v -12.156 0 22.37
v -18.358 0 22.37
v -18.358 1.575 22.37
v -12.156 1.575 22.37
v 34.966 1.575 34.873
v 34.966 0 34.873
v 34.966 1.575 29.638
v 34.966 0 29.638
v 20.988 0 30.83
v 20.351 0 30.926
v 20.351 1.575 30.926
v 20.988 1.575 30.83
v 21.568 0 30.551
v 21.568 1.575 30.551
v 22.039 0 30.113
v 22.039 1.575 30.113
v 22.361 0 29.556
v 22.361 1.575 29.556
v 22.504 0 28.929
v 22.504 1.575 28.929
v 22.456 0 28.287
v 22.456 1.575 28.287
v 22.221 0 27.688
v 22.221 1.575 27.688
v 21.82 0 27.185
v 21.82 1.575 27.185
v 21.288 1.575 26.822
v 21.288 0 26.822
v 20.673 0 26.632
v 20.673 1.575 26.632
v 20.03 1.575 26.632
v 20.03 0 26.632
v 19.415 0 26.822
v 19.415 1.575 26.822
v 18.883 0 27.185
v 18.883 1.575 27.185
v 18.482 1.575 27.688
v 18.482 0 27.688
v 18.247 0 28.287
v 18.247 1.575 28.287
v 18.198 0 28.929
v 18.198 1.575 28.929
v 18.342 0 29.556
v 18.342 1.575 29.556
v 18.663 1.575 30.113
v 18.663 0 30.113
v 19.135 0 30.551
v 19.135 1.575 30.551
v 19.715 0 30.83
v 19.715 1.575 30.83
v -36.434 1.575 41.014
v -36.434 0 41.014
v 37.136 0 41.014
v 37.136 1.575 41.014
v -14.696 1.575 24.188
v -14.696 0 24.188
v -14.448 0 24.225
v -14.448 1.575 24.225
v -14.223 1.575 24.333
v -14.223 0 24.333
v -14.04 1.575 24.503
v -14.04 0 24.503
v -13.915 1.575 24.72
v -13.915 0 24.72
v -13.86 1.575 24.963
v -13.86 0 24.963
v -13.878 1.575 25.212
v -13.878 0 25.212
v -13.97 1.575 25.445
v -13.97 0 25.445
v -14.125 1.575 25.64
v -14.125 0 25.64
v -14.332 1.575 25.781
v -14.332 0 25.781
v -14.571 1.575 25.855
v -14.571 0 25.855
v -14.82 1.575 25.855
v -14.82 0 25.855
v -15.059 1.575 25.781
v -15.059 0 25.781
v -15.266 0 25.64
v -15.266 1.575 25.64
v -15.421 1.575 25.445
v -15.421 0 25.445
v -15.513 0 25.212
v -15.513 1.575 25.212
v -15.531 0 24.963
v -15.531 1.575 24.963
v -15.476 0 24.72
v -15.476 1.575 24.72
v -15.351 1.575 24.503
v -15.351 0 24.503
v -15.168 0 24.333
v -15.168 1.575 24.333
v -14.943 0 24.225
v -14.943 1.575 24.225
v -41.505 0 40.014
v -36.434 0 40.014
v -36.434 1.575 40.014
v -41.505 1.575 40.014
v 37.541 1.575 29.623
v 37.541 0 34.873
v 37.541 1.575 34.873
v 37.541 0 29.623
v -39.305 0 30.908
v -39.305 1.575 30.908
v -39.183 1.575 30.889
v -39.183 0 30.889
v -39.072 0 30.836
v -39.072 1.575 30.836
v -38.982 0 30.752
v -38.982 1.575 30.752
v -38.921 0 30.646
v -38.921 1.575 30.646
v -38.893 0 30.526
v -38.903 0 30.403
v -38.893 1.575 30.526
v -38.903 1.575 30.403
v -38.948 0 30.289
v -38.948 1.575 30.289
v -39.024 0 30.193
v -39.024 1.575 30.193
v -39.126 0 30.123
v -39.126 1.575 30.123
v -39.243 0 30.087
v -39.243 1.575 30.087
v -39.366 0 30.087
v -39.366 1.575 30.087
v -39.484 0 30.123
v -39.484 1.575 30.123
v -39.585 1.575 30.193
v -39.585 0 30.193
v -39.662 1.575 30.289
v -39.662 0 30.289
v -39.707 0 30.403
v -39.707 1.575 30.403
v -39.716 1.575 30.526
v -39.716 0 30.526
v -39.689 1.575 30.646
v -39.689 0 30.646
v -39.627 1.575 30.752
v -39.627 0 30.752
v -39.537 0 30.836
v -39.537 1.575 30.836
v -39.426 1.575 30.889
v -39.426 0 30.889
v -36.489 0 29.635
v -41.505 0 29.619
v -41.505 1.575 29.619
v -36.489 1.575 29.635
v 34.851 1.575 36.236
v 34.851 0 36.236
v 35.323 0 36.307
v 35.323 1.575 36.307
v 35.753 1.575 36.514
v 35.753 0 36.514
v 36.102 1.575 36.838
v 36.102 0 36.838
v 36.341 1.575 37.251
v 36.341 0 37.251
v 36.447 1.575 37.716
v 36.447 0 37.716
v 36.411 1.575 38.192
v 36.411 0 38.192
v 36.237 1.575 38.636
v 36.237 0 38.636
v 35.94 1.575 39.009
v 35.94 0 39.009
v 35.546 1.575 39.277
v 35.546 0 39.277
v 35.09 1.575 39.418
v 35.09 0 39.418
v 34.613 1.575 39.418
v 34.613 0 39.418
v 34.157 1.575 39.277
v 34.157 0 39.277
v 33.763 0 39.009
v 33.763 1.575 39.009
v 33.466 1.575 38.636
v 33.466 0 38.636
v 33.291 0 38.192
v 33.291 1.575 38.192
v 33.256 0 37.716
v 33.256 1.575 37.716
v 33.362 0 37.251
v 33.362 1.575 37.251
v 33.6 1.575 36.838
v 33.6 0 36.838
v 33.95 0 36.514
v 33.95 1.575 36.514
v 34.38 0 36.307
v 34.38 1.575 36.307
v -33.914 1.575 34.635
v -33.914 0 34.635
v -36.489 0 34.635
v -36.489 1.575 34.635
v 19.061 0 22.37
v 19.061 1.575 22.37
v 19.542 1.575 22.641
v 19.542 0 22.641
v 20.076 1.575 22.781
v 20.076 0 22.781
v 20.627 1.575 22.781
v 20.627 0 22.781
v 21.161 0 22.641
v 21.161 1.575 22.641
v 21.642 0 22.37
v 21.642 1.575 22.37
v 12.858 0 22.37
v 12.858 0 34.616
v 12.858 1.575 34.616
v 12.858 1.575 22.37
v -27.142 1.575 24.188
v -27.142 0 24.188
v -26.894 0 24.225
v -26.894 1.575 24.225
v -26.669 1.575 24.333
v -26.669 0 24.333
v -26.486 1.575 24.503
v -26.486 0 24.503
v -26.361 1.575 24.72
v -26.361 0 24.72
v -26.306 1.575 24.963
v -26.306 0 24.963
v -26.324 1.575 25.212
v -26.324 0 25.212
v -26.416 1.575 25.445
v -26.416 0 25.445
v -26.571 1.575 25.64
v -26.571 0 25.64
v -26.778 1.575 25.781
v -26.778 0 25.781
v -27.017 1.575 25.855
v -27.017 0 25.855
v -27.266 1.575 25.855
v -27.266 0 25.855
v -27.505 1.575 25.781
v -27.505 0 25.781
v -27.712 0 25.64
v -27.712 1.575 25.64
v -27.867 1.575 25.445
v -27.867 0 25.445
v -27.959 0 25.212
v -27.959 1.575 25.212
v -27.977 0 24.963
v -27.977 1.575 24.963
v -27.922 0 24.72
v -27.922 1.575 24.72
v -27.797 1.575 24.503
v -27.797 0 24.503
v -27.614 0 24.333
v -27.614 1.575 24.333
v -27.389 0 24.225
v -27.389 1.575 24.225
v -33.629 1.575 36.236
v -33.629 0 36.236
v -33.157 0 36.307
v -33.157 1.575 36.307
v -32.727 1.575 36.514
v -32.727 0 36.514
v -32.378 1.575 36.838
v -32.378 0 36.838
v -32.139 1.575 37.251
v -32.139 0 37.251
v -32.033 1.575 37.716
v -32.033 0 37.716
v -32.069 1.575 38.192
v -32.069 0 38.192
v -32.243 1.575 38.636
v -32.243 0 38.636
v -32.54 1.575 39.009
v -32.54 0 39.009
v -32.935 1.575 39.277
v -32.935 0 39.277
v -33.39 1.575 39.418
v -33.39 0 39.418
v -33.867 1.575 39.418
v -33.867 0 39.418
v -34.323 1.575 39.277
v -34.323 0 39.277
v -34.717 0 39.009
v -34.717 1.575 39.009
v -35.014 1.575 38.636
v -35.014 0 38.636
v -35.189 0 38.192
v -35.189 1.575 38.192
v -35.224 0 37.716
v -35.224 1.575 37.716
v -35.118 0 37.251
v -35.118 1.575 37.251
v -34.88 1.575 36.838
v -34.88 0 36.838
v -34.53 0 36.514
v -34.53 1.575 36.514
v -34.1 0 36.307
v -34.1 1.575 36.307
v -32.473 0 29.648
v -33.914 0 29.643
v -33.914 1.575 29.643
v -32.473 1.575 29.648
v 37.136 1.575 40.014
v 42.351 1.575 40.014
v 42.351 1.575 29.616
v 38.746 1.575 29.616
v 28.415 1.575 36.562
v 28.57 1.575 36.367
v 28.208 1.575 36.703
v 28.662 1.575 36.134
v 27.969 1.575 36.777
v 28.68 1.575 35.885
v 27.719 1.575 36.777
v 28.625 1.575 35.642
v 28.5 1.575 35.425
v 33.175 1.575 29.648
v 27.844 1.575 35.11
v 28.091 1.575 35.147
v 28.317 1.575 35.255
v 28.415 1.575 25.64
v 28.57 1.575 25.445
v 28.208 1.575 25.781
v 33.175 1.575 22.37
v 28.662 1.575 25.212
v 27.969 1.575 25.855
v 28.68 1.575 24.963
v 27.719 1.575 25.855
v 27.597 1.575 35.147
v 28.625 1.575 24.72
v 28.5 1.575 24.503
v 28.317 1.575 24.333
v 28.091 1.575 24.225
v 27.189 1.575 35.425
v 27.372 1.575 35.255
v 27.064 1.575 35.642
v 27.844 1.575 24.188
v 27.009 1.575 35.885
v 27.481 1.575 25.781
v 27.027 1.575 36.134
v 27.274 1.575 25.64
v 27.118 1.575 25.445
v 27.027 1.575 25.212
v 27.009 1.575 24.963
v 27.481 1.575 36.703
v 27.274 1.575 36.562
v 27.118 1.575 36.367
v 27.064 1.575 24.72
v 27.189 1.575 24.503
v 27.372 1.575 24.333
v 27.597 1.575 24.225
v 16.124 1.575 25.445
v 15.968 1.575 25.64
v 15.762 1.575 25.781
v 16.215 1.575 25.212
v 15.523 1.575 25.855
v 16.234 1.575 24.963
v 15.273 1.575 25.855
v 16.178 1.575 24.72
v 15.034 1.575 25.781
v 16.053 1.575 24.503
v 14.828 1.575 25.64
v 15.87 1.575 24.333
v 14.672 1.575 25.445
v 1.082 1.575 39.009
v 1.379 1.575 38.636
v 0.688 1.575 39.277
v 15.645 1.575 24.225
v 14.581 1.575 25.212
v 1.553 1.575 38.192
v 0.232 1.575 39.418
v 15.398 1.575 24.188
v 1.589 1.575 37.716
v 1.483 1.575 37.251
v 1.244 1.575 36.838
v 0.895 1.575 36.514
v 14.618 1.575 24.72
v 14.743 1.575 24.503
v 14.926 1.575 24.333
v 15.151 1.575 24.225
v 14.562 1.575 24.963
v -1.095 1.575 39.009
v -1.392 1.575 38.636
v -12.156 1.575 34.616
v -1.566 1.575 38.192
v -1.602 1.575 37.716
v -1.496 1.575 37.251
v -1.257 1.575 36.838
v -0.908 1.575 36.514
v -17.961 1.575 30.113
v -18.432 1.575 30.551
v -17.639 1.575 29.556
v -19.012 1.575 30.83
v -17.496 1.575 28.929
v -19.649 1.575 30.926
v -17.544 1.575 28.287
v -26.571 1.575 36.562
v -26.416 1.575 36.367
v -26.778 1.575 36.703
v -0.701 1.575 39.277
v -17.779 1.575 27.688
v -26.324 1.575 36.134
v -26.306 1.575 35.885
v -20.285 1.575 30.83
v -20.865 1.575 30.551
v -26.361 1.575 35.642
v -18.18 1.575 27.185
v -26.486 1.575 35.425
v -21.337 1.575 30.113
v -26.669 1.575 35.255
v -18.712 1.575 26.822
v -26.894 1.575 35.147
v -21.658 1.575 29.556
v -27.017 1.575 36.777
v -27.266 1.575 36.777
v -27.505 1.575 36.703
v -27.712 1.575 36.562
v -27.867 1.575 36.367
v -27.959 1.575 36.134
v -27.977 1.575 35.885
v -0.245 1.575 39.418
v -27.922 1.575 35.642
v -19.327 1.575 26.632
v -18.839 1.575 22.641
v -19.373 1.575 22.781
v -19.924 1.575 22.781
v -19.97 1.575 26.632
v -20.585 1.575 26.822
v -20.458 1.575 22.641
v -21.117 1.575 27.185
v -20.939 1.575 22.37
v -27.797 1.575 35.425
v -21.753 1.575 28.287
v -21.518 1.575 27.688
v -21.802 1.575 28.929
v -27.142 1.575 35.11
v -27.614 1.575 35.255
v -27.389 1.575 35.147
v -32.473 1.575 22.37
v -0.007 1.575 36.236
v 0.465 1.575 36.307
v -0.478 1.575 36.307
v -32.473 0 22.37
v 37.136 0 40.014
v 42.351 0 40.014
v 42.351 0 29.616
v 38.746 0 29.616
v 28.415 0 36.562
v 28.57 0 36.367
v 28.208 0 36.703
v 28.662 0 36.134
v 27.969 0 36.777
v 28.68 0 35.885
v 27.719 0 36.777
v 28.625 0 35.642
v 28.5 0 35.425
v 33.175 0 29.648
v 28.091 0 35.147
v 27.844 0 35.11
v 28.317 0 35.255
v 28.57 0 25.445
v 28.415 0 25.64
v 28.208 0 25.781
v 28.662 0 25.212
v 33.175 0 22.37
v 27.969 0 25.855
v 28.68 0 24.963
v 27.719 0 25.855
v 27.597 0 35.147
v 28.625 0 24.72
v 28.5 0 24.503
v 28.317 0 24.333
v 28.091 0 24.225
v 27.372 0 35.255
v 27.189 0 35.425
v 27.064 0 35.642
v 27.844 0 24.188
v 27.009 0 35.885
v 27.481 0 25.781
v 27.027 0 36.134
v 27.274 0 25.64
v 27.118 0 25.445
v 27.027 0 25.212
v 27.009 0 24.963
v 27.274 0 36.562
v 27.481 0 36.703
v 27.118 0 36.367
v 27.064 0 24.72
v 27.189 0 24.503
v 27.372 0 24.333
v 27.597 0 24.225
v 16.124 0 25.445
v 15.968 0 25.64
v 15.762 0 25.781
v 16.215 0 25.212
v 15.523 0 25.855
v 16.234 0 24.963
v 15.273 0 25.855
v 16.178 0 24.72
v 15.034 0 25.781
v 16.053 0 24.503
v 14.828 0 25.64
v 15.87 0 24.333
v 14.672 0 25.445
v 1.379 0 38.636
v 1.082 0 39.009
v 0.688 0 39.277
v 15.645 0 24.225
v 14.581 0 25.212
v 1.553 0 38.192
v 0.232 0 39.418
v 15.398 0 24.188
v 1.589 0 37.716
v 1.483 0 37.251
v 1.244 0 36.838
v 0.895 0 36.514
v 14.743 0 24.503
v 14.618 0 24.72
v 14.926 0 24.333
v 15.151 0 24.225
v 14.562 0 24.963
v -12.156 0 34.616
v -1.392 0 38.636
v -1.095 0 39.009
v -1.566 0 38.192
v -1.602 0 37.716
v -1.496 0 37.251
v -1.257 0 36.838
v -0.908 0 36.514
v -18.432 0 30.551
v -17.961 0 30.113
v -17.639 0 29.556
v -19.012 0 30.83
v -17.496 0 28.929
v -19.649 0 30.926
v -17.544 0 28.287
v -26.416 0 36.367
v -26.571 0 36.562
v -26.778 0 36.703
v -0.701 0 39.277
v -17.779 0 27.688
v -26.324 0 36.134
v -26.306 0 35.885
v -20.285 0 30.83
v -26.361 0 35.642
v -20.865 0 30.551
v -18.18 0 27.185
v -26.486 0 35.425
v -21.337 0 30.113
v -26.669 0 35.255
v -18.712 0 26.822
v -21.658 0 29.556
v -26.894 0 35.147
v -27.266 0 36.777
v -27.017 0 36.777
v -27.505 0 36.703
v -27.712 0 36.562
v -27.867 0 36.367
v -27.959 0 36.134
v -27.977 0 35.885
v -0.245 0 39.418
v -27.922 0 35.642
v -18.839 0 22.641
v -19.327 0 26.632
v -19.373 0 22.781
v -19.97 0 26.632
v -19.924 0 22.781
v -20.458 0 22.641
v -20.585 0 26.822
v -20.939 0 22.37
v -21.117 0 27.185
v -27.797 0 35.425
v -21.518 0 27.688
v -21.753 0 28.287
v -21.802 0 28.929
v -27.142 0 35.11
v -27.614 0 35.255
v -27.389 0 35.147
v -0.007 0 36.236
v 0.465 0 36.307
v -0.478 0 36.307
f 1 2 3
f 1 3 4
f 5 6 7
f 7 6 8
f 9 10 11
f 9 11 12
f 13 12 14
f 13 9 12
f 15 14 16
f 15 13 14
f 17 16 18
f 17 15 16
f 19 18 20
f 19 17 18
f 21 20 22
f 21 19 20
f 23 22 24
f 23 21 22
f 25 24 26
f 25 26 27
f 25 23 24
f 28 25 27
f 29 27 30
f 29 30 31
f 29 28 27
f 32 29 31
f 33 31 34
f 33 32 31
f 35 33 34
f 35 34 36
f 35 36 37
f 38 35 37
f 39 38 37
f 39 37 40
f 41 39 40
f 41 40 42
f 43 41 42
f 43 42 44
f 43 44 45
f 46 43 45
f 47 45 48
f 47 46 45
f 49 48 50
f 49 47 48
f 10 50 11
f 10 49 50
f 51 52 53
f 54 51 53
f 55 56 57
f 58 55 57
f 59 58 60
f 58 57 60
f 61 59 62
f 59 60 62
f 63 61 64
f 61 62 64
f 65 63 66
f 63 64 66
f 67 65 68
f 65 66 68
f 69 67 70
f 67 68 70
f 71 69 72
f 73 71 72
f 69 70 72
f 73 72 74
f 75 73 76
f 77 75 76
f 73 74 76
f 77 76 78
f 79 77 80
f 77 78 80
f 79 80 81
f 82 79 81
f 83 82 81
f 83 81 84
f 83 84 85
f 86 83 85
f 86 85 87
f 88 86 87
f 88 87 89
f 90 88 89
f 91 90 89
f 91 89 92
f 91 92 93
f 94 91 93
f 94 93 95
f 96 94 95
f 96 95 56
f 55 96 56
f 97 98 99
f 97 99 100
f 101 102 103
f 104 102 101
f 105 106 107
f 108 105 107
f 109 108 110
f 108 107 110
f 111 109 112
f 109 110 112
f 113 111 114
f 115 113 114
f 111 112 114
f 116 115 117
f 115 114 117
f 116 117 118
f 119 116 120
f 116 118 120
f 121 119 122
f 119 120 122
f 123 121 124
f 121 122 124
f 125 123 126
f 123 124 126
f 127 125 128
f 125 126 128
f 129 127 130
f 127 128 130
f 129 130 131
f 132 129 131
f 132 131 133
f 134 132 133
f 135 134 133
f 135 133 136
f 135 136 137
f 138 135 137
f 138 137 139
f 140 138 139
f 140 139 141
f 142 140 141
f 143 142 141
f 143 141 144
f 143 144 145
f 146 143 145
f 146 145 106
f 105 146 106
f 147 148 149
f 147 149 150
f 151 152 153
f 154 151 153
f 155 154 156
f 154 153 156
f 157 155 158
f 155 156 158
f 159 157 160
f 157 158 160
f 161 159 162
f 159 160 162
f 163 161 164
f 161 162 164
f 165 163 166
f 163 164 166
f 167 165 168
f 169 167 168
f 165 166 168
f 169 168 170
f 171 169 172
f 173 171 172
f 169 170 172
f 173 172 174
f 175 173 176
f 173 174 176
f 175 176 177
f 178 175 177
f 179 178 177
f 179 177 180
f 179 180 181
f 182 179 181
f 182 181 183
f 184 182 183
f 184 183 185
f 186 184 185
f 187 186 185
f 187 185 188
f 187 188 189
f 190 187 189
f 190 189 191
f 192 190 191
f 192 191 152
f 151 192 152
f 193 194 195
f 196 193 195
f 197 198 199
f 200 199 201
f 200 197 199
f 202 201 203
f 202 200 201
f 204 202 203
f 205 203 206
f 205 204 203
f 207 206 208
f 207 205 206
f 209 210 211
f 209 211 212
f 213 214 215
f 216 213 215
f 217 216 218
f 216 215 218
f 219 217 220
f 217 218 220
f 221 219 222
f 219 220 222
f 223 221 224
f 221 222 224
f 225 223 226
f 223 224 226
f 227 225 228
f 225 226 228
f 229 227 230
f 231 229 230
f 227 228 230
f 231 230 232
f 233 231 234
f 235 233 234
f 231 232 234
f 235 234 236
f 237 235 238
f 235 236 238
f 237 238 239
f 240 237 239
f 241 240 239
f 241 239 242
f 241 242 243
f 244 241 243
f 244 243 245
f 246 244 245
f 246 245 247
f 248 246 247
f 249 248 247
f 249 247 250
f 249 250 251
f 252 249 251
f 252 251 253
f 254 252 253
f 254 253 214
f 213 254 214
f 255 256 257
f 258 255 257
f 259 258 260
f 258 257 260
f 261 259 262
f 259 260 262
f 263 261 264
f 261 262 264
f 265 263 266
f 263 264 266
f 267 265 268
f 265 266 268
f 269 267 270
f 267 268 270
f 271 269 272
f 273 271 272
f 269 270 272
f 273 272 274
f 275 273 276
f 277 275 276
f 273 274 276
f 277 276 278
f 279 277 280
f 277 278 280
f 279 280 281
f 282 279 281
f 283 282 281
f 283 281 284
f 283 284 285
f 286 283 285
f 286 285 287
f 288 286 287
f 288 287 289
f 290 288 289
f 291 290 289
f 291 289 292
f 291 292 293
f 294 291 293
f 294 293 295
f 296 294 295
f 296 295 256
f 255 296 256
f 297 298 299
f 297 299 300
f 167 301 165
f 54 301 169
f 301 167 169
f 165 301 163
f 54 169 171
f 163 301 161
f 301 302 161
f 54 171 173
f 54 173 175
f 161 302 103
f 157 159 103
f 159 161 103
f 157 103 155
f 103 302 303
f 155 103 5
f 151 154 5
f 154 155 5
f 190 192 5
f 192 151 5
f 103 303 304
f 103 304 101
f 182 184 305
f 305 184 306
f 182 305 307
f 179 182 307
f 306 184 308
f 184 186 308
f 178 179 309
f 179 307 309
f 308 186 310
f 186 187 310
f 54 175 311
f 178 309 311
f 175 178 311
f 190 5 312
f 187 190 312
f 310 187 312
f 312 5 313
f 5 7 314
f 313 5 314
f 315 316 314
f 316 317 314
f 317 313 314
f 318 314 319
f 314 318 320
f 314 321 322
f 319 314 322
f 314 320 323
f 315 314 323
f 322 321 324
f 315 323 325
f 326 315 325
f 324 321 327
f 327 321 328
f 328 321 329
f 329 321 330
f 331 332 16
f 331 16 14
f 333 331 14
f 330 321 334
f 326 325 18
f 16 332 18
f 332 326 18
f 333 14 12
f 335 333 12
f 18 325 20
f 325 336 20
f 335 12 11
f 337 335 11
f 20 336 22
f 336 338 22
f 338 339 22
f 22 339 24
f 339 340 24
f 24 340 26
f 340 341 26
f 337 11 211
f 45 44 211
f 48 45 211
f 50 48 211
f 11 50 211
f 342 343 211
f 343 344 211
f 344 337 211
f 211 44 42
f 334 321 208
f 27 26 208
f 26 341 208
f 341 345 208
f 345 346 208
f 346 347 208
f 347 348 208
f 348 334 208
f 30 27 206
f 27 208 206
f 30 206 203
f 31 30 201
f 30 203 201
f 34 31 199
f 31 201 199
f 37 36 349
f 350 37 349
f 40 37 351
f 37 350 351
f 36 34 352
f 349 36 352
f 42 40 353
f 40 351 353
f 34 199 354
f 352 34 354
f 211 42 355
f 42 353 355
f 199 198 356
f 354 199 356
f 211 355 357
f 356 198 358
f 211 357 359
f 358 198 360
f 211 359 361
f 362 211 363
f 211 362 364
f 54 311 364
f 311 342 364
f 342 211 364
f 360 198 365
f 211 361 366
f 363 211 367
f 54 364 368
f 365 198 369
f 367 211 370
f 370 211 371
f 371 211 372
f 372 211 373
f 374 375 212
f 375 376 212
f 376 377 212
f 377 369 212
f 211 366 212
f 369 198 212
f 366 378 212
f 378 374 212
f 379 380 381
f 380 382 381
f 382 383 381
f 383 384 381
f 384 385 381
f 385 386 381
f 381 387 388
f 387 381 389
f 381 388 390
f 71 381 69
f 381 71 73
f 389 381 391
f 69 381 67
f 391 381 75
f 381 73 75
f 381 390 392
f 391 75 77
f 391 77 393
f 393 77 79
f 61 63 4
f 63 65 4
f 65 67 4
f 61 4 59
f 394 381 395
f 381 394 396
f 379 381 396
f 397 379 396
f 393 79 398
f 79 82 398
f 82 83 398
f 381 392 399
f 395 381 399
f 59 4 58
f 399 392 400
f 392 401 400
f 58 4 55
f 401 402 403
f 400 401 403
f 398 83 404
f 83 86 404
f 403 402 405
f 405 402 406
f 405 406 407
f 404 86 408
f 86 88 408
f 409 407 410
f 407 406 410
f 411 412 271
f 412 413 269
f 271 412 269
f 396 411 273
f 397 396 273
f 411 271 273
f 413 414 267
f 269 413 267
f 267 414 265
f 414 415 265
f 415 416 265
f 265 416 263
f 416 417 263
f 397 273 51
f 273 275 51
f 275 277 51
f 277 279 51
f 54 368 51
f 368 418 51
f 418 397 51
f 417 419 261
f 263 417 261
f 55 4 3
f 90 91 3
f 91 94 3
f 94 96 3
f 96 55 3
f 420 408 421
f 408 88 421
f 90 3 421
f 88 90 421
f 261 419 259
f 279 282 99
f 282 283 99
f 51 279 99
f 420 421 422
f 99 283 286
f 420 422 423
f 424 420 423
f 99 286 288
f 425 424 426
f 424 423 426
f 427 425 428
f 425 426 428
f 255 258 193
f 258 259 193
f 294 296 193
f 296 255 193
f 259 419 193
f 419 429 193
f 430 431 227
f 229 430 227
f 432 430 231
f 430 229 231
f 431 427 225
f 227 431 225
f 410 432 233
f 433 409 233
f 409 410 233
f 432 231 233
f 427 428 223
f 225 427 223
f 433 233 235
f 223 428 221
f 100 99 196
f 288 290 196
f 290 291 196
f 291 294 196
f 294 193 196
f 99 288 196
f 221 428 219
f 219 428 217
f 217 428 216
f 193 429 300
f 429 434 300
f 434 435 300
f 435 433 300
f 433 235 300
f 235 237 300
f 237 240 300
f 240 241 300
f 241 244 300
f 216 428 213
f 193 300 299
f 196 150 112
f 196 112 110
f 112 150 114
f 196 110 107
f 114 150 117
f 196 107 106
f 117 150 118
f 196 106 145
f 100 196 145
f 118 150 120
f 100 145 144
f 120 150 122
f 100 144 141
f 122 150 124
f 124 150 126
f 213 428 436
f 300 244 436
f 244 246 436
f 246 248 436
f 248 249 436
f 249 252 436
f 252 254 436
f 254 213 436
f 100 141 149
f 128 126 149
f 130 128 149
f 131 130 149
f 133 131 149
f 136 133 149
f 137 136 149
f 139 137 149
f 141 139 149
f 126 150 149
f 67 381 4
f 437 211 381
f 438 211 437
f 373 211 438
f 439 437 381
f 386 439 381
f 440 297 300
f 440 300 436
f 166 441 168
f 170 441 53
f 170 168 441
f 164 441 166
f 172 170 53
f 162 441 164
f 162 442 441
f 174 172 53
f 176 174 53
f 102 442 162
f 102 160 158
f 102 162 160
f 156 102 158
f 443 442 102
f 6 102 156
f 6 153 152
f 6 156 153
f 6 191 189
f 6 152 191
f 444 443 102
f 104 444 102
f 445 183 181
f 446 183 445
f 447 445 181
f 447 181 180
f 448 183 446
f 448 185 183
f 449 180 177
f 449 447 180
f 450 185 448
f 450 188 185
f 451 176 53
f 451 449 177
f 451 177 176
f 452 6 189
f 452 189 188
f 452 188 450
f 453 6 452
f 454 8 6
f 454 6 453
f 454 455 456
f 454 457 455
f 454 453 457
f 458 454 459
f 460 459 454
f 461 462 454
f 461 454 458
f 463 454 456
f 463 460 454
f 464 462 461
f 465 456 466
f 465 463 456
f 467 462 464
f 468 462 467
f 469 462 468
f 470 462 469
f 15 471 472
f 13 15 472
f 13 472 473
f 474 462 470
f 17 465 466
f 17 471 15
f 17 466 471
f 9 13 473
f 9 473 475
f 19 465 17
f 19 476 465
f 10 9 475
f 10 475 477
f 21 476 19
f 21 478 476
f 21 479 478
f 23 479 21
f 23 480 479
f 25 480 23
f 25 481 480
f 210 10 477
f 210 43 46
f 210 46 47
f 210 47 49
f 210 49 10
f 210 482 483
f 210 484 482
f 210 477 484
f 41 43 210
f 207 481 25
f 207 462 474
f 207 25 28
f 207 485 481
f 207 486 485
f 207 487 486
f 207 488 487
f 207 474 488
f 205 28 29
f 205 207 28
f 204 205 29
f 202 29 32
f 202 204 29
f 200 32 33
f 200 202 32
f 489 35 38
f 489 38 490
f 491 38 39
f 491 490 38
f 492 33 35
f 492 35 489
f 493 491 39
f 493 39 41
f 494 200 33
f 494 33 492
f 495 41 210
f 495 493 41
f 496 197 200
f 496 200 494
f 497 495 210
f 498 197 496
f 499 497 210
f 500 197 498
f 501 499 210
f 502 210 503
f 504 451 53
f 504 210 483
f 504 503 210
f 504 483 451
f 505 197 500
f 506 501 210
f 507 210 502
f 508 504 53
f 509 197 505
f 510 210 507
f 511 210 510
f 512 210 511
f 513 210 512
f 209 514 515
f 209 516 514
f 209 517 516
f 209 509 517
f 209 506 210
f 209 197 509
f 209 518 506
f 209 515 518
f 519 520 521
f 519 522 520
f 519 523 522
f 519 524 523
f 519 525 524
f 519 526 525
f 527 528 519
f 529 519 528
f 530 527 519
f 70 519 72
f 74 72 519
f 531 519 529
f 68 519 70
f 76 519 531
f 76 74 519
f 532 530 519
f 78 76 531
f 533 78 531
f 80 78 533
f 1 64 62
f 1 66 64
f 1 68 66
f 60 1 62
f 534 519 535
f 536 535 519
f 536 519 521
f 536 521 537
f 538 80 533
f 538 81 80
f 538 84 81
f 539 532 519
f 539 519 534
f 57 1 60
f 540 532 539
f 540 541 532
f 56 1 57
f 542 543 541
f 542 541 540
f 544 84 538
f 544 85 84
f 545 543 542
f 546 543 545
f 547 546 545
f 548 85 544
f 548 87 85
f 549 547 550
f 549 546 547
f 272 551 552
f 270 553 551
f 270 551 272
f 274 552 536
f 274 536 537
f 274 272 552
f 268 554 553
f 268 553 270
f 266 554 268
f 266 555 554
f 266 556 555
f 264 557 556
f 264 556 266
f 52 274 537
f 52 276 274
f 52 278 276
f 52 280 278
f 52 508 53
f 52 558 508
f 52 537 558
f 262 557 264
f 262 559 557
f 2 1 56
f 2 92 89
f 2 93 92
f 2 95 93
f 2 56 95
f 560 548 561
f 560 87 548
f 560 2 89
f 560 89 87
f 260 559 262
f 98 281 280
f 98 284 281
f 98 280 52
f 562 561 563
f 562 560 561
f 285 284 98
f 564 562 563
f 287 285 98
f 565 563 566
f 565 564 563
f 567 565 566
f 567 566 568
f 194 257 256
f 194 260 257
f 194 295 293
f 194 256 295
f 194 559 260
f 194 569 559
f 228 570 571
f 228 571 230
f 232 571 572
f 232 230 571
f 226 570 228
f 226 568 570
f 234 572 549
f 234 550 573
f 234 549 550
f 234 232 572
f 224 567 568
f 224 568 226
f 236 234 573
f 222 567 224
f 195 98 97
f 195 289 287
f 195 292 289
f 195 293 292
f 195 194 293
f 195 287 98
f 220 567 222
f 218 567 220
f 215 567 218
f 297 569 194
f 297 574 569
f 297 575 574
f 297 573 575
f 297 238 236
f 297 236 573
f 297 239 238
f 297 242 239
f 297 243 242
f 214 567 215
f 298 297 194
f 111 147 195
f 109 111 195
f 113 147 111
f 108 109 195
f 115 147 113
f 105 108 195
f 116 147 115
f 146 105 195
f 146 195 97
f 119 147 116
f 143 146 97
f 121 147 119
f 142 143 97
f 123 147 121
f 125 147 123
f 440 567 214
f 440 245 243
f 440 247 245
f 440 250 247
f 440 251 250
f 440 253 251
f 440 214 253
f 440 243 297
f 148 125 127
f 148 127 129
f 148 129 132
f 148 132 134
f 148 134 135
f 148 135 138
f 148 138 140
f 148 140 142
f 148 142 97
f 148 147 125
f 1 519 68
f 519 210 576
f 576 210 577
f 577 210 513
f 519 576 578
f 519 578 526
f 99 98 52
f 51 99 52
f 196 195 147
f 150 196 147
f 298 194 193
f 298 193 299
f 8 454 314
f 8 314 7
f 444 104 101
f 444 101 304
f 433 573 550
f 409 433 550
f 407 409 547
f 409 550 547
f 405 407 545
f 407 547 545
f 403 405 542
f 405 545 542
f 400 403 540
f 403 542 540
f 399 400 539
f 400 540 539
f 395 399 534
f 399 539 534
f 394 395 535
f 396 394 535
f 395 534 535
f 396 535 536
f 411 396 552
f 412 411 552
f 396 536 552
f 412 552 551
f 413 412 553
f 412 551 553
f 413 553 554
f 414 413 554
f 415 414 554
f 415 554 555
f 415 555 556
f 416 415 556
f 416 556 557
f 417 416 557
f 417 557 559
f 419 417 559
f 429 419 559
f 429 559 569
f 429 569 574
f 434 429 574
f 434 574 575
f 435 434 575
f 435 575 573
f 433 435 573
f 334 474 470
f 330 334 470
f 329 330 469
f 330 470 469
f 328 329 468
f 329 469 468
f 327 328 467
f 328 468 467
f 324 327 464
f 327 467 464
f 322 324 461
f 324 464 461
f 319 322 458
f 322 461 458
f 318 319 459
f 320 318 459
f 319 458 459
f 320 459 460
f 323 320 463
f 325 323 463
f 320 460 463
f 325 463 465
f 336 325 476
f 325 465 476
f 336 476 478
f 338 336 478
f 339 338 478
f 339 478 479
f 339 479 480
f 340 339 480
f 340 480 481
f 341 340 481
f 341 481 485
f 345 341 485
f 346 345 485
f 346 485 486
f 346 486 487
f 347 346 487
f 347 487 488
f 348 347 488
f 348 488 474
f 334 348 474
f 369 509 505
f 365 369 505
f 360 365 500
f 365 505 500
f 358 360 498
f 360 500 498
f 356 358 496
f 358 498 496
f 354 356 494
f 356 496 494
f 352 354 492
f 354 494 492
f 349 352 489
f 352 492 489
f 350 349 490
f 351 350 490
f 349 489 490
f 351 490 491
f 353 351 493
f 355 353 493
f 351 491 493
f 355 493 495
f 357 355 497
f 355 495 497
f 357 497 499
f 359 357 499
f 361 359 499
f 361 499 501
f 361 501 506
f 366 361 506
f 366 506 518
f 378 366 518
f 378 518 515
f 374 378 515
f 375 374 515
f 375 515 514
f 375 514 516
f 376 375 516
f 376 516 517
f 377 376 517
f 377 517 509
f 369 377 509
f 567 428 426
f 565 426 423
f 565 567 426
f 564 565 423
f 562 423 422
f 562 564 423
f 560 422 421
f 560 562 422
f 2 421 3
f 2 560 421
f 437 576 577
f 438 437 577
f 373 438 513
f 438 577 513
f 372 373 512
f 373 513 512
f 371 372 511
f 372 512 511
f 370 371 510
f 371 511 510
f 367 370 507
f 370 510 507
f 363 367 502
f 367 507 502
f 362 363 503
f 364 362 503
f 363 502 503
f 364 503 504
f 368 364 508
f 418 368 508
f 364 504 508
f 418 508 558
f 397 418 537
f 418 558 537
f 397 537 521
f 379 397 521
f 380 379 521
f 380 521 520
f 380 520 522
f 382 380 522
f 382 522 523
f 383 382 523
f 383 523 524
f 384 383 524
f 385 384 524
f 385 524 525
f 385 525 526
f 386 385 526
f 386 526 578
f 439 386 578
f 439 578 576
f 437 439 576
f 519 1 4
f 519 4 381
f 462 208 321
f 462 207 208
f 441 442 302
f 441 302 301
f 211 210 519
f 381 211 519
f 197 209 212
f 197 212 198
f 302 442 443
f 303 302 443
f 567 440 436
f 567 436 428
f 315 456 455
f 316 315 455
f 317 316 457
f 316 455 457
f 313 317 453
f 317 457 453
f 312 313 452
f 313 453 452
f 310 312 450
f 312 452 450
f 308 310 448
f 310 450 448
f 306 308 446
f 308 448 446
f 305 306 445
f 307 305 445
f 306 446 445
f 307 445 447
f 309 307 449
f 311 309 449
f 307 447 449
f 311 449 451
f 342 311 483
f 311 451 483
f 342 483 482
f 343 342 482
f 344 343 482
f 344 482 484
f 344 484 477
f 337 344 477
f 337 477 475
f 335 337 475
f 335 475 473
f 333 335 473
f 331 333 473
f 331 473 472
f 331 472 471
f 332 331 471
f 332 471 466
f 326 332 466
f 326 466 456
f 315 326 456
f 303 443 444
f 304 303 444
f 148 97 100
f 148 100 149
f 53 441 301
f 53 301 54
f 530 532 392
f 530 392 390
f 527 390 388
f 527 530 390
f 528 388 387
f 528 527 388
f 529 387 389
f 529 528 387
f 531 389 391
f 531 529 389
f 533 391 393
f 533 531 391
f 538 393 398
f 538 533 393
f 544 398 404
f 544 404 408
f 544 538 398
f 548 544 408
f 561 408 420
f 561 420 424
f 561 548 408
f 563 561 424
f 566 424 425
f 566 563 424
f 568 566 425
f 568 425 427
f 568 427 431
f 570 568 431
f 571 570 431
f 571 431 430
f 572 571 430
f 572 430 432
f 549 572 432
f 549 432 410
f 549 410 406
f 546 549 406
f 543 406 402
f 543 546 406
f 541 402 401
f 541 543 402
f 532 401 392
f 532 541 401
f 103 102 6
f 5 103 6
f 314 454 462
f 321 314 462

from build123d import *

# Parameters (mm, degrees)
SKETCH1_R                           = 2.159
BOSS_EXTRUDE1_DEPTH                 = 1.575
SKETCH2_W                           = 93.457658642
SKETCH2_H                           = 6.602
CUT_EXTRUDE1_DEPTH                  = 65.362755899
CUT_EXTRUDE2_DEPTH                  = 60.755092082
CUT_EXTRUDE3_DEPTH                  = 60.755092082
SKETCH6_R                           = 0.8382
CUT_EXTRUDE4_DEPTH                  = 2.54
SKETCH7_W                           = 65.648
SKETCH7_H                           = 12
CUT_EXTRUDE5_DEPTH                  = 59.286069146
SKETCH11_R                          = 0.412551942
ID_HOLE_DEPTH                       = 59.286069146
SKETCH12_W                          = 2.575
SKETCH12_H                          = 5
NOTCH_FOR_BPR_TOP_VIEW_DEPTH        = 59.286069146
SKETCH14_W                          = 2.575
SKETCH14_H                          = 12.502619879
NOTCH_FOR_BPL_TOP_VIEW_DEPTH        = 59.286069146
SKETCH17_W                          = 73.57
SKETCH17_H                          = 1
CREATE_LIP_FOR_M3_SPACER_HOLE_DEPTH = 1.575
SKETCH15_R                          = 1.6
HOLE_FOR_M3_SPACER_DEPTH            = 59.977069112


with BuildPart() as part:
    # Sketch1 → Boss-Extrude1 (new body)
    with BuildSketch(Plane(origin=(0, 0, 0), x_dir=(1, 0, 0), z_dir=(0, 1, 0))):
        Polygon((44.351293299, -40.014412246), (37.136293299, -40.014412246), (37.136293299, -46.615946892), (29.968293307, -46.615946892), (-30.083706693, -46.615946892), (-36.433706701, -46.615946892), (-36.433706701, -40.014412246), (-43.648706701, -40.014412246), (-43.648706701, -30.885946892), (-43.648706701, -29.647946892), (-42.378706693, -29.615946892), (-32.472706701, -29.647946892), (-32.472706701, -10.370428445), (-12.155556701, -10.370428445), (-12.155556701, -34.615947016), (-11.557706701, -34.615947016), (12.260293299, -34.615947016), (12.858143299, -34.615947016), (12.858143299, -10.370428445), (33.175293299, -10.370428445), (33.175293299, -12.929386892), (33.175293299, -29.647946892), (38.746293307, -29.615946892), (42.351293307, -29.615946892), (44.351293299, -29.615946892), (44.351293299, -31.651946892), align=None)
        with Locations(Location((-19.648556701, -28.76738335, 0), (0, 0, 270))):
            Circle(SKETCH1_R, mode=Mode.SUBTRACT)
        with Locations(Location((-19.648556701, -20.63938335, 0), (0, 0, 270))):
            Circle(SKETCH1_R, mode=Mode.SUBTRACT)
        with Locations(Location((20.351397299, -20.63938335, 0), (0, 0, 270))):
            Circle(SKETCH1_R, mode=Mode.SUBTRACT)
        with Locations(Location((20.351397299, -28.76738335, 0), (0, 0, 270))):
            Circle(SKETCH1_R, mode=Mode.SUBTRACT)
    extrude(amount=BOSS_EXTRUDE1_DEPTH)

    # Sketch2 → Cut-Extrude1 (cut, through all)
    with BuildSketch(Plane.XZ):
        with Locations((-2.377536022, 43.315412246)):
            Rectangle(SKETCH2_W, SKETCH2_H)
    extrude(amount=-CUT_EXTRUDE1_DEPTH, mode=Mode.SUBTRACT)

    # Sketch3 → Cut-Extrude2 (cut, through all)
    with BuildSketch(Plane.XZ):
        Polygon((-41.504650493, 40.014412246), (-41.504650493, 29.618770413), (-34.629650483, 29.640979175), (-34.629650483, 8.976090323), (-48.128778183, 8.976090323), (-48.128778183, 40.014412246), align=None)
    extrude(amount=-CUT_EXTRUDE2_DEPTH, mode=Mode.SUBTRACT)

    # Sketch4 → Cut-Extrude3 (cut, through all)
    with BuildSketch(Plane.XZ):
        Polygon((42.351293299, 40.014412246), (42.351293299, 32.420104455), (42.351293299, 29.615946892), (35.476293307, 29.615946892), (35.476293307, 10.370428445), (54.710892309, 10.370428445), (54.710892309, 40.014412246), align=None)
    extrude(amount=-CUT_EXTRUDE3_DEPTH, mode=Mode.SUBTRACT)

    # Sketch6 → Cut-Extrude4 (cut)
    with BuildSketch(Plane(origin=(0, 0, 0), x_dir=(-1, 0, 0), z_dir=(0, -1, 0))):
        with Locations(Location((27.141556701, -35.947946892, 0), (0, 0, 90))):
            Circle(SKETCH6_R)
        with Locations(Location((27.141556701, -25.025946892, 0), (0, 0, 90))):
            Circle(SKETCH6_R)
        with Locations(Location((14.695556701, -25.025946892, 0), (0, 0, 90))):
            Circle(SKETCH6_R)
        with Locations(Location((-15.398143299, -25.025946892, 0), (0, 0, 90))):
            Circle(SKETCH6_R)
        with Locations(Location((-27.844397299, -25.025946892, 0), (0, 0, 90))):
            Circle(SKETCH6_R)
        with Locations(Location((-27.844397299, -35.947946892, 0), (0, 0, 90))):
            Circle(SKETCH6_R)
    extrude(amount=-CUT_EXTRUDE4_DEPTH, mode=Mode.SUBTRACT)

    # Sketch7 → Cut-Extrude5 (cut, through all)
    with BuildSketch(Plane.XZ):
        with Locations((0.351293299, 16.370428445)):
            Rectangle(SKETCH7_W, SKETCH7_H)
    extrude(amount=-CUT_EXTRUDE5_DEPTH, mode=Mode.SUBTRACT)

    # Sketch11 → ID HOLE (cut, through all)
    with BuildSketch(Plane(origin=(0, 1.575, 0), x_dir=(1, 0, 0), z_dir=(0, 1, 0))):
        with Locations(Location((-39.304798754, -30.495020326, 0), (0, 0, 270))):
            Circle(SKETCH11_R)
    extrude(amount=-ID_HOLE_DEPTH, mode=Mode.SUBTRACT)

    # Sketch12 → Notch for BPR (TOP VIEW) (cut, through all)
    with BuildSketch(Plane(origin=(0, 0, 0), x_dir=(-1, 0, 0), z_dir=(0, -1, 0))):
        with Locations((35.201150493, -32.134973926)):
            Rectangle(SKETCH12_W, SKETCH12_H)
    extrude(amount=-NOTCH_FOR_BPR_TOP_VIEW_DEPTH, mode=Mode.SUBTRACT)

    # Sketch14 → Notch for BPL (TOP VIEW) (cut, through all)
    with BuildSketch(Plane(origin=(0, 0, 0), x_dir=(-1, 0, 0), z_dir=(0, -1, 0))):
        with Locations((-36.253849507, -28.621738385)):
            Rectangle(SKETCH14_W, SKETCH14_H)
    extrude(amount=-NOTCH_FOR_BPL_TOP_VIEW_DEPTH, mode=Mode.SUBTRACT)

    # Sketch17 → Create Lip for M3 Spacer Hole (add)
    with BuildSketch(Plane.XZ):
        with Locations((0.351293299, 40.514412246)):
            Rectangle(SKETCH17_W, SKETCH17_H)
    extrude(amount=-CREATE_LIP_FOR_M3_SPACER_HOLE_DEPTH)

    # Sketch15 → HOLE for M3 Spacer (cut, through all)
    with BuildSketch(Plane.XZ):
        with Locations(Location((-0.006565304, 37.835831124, 0), (0, 0, 270))):
            Circle(SKETCH15_R)
        with Locations(Location((-33.628715371, 37.835831124, 0), (0, 0, 270))):
            Circle(SKETCH15_R)
        with Locations(Location((34.851293299, 37.835831124, 0), (0, 0, 270))):
            Circle(SKETCH15_R)
    extrude(amount=-HOLE_FOR_M3_SPACER_DEPTH, mode=Mode.SUBTRACT)


solid = part.part
